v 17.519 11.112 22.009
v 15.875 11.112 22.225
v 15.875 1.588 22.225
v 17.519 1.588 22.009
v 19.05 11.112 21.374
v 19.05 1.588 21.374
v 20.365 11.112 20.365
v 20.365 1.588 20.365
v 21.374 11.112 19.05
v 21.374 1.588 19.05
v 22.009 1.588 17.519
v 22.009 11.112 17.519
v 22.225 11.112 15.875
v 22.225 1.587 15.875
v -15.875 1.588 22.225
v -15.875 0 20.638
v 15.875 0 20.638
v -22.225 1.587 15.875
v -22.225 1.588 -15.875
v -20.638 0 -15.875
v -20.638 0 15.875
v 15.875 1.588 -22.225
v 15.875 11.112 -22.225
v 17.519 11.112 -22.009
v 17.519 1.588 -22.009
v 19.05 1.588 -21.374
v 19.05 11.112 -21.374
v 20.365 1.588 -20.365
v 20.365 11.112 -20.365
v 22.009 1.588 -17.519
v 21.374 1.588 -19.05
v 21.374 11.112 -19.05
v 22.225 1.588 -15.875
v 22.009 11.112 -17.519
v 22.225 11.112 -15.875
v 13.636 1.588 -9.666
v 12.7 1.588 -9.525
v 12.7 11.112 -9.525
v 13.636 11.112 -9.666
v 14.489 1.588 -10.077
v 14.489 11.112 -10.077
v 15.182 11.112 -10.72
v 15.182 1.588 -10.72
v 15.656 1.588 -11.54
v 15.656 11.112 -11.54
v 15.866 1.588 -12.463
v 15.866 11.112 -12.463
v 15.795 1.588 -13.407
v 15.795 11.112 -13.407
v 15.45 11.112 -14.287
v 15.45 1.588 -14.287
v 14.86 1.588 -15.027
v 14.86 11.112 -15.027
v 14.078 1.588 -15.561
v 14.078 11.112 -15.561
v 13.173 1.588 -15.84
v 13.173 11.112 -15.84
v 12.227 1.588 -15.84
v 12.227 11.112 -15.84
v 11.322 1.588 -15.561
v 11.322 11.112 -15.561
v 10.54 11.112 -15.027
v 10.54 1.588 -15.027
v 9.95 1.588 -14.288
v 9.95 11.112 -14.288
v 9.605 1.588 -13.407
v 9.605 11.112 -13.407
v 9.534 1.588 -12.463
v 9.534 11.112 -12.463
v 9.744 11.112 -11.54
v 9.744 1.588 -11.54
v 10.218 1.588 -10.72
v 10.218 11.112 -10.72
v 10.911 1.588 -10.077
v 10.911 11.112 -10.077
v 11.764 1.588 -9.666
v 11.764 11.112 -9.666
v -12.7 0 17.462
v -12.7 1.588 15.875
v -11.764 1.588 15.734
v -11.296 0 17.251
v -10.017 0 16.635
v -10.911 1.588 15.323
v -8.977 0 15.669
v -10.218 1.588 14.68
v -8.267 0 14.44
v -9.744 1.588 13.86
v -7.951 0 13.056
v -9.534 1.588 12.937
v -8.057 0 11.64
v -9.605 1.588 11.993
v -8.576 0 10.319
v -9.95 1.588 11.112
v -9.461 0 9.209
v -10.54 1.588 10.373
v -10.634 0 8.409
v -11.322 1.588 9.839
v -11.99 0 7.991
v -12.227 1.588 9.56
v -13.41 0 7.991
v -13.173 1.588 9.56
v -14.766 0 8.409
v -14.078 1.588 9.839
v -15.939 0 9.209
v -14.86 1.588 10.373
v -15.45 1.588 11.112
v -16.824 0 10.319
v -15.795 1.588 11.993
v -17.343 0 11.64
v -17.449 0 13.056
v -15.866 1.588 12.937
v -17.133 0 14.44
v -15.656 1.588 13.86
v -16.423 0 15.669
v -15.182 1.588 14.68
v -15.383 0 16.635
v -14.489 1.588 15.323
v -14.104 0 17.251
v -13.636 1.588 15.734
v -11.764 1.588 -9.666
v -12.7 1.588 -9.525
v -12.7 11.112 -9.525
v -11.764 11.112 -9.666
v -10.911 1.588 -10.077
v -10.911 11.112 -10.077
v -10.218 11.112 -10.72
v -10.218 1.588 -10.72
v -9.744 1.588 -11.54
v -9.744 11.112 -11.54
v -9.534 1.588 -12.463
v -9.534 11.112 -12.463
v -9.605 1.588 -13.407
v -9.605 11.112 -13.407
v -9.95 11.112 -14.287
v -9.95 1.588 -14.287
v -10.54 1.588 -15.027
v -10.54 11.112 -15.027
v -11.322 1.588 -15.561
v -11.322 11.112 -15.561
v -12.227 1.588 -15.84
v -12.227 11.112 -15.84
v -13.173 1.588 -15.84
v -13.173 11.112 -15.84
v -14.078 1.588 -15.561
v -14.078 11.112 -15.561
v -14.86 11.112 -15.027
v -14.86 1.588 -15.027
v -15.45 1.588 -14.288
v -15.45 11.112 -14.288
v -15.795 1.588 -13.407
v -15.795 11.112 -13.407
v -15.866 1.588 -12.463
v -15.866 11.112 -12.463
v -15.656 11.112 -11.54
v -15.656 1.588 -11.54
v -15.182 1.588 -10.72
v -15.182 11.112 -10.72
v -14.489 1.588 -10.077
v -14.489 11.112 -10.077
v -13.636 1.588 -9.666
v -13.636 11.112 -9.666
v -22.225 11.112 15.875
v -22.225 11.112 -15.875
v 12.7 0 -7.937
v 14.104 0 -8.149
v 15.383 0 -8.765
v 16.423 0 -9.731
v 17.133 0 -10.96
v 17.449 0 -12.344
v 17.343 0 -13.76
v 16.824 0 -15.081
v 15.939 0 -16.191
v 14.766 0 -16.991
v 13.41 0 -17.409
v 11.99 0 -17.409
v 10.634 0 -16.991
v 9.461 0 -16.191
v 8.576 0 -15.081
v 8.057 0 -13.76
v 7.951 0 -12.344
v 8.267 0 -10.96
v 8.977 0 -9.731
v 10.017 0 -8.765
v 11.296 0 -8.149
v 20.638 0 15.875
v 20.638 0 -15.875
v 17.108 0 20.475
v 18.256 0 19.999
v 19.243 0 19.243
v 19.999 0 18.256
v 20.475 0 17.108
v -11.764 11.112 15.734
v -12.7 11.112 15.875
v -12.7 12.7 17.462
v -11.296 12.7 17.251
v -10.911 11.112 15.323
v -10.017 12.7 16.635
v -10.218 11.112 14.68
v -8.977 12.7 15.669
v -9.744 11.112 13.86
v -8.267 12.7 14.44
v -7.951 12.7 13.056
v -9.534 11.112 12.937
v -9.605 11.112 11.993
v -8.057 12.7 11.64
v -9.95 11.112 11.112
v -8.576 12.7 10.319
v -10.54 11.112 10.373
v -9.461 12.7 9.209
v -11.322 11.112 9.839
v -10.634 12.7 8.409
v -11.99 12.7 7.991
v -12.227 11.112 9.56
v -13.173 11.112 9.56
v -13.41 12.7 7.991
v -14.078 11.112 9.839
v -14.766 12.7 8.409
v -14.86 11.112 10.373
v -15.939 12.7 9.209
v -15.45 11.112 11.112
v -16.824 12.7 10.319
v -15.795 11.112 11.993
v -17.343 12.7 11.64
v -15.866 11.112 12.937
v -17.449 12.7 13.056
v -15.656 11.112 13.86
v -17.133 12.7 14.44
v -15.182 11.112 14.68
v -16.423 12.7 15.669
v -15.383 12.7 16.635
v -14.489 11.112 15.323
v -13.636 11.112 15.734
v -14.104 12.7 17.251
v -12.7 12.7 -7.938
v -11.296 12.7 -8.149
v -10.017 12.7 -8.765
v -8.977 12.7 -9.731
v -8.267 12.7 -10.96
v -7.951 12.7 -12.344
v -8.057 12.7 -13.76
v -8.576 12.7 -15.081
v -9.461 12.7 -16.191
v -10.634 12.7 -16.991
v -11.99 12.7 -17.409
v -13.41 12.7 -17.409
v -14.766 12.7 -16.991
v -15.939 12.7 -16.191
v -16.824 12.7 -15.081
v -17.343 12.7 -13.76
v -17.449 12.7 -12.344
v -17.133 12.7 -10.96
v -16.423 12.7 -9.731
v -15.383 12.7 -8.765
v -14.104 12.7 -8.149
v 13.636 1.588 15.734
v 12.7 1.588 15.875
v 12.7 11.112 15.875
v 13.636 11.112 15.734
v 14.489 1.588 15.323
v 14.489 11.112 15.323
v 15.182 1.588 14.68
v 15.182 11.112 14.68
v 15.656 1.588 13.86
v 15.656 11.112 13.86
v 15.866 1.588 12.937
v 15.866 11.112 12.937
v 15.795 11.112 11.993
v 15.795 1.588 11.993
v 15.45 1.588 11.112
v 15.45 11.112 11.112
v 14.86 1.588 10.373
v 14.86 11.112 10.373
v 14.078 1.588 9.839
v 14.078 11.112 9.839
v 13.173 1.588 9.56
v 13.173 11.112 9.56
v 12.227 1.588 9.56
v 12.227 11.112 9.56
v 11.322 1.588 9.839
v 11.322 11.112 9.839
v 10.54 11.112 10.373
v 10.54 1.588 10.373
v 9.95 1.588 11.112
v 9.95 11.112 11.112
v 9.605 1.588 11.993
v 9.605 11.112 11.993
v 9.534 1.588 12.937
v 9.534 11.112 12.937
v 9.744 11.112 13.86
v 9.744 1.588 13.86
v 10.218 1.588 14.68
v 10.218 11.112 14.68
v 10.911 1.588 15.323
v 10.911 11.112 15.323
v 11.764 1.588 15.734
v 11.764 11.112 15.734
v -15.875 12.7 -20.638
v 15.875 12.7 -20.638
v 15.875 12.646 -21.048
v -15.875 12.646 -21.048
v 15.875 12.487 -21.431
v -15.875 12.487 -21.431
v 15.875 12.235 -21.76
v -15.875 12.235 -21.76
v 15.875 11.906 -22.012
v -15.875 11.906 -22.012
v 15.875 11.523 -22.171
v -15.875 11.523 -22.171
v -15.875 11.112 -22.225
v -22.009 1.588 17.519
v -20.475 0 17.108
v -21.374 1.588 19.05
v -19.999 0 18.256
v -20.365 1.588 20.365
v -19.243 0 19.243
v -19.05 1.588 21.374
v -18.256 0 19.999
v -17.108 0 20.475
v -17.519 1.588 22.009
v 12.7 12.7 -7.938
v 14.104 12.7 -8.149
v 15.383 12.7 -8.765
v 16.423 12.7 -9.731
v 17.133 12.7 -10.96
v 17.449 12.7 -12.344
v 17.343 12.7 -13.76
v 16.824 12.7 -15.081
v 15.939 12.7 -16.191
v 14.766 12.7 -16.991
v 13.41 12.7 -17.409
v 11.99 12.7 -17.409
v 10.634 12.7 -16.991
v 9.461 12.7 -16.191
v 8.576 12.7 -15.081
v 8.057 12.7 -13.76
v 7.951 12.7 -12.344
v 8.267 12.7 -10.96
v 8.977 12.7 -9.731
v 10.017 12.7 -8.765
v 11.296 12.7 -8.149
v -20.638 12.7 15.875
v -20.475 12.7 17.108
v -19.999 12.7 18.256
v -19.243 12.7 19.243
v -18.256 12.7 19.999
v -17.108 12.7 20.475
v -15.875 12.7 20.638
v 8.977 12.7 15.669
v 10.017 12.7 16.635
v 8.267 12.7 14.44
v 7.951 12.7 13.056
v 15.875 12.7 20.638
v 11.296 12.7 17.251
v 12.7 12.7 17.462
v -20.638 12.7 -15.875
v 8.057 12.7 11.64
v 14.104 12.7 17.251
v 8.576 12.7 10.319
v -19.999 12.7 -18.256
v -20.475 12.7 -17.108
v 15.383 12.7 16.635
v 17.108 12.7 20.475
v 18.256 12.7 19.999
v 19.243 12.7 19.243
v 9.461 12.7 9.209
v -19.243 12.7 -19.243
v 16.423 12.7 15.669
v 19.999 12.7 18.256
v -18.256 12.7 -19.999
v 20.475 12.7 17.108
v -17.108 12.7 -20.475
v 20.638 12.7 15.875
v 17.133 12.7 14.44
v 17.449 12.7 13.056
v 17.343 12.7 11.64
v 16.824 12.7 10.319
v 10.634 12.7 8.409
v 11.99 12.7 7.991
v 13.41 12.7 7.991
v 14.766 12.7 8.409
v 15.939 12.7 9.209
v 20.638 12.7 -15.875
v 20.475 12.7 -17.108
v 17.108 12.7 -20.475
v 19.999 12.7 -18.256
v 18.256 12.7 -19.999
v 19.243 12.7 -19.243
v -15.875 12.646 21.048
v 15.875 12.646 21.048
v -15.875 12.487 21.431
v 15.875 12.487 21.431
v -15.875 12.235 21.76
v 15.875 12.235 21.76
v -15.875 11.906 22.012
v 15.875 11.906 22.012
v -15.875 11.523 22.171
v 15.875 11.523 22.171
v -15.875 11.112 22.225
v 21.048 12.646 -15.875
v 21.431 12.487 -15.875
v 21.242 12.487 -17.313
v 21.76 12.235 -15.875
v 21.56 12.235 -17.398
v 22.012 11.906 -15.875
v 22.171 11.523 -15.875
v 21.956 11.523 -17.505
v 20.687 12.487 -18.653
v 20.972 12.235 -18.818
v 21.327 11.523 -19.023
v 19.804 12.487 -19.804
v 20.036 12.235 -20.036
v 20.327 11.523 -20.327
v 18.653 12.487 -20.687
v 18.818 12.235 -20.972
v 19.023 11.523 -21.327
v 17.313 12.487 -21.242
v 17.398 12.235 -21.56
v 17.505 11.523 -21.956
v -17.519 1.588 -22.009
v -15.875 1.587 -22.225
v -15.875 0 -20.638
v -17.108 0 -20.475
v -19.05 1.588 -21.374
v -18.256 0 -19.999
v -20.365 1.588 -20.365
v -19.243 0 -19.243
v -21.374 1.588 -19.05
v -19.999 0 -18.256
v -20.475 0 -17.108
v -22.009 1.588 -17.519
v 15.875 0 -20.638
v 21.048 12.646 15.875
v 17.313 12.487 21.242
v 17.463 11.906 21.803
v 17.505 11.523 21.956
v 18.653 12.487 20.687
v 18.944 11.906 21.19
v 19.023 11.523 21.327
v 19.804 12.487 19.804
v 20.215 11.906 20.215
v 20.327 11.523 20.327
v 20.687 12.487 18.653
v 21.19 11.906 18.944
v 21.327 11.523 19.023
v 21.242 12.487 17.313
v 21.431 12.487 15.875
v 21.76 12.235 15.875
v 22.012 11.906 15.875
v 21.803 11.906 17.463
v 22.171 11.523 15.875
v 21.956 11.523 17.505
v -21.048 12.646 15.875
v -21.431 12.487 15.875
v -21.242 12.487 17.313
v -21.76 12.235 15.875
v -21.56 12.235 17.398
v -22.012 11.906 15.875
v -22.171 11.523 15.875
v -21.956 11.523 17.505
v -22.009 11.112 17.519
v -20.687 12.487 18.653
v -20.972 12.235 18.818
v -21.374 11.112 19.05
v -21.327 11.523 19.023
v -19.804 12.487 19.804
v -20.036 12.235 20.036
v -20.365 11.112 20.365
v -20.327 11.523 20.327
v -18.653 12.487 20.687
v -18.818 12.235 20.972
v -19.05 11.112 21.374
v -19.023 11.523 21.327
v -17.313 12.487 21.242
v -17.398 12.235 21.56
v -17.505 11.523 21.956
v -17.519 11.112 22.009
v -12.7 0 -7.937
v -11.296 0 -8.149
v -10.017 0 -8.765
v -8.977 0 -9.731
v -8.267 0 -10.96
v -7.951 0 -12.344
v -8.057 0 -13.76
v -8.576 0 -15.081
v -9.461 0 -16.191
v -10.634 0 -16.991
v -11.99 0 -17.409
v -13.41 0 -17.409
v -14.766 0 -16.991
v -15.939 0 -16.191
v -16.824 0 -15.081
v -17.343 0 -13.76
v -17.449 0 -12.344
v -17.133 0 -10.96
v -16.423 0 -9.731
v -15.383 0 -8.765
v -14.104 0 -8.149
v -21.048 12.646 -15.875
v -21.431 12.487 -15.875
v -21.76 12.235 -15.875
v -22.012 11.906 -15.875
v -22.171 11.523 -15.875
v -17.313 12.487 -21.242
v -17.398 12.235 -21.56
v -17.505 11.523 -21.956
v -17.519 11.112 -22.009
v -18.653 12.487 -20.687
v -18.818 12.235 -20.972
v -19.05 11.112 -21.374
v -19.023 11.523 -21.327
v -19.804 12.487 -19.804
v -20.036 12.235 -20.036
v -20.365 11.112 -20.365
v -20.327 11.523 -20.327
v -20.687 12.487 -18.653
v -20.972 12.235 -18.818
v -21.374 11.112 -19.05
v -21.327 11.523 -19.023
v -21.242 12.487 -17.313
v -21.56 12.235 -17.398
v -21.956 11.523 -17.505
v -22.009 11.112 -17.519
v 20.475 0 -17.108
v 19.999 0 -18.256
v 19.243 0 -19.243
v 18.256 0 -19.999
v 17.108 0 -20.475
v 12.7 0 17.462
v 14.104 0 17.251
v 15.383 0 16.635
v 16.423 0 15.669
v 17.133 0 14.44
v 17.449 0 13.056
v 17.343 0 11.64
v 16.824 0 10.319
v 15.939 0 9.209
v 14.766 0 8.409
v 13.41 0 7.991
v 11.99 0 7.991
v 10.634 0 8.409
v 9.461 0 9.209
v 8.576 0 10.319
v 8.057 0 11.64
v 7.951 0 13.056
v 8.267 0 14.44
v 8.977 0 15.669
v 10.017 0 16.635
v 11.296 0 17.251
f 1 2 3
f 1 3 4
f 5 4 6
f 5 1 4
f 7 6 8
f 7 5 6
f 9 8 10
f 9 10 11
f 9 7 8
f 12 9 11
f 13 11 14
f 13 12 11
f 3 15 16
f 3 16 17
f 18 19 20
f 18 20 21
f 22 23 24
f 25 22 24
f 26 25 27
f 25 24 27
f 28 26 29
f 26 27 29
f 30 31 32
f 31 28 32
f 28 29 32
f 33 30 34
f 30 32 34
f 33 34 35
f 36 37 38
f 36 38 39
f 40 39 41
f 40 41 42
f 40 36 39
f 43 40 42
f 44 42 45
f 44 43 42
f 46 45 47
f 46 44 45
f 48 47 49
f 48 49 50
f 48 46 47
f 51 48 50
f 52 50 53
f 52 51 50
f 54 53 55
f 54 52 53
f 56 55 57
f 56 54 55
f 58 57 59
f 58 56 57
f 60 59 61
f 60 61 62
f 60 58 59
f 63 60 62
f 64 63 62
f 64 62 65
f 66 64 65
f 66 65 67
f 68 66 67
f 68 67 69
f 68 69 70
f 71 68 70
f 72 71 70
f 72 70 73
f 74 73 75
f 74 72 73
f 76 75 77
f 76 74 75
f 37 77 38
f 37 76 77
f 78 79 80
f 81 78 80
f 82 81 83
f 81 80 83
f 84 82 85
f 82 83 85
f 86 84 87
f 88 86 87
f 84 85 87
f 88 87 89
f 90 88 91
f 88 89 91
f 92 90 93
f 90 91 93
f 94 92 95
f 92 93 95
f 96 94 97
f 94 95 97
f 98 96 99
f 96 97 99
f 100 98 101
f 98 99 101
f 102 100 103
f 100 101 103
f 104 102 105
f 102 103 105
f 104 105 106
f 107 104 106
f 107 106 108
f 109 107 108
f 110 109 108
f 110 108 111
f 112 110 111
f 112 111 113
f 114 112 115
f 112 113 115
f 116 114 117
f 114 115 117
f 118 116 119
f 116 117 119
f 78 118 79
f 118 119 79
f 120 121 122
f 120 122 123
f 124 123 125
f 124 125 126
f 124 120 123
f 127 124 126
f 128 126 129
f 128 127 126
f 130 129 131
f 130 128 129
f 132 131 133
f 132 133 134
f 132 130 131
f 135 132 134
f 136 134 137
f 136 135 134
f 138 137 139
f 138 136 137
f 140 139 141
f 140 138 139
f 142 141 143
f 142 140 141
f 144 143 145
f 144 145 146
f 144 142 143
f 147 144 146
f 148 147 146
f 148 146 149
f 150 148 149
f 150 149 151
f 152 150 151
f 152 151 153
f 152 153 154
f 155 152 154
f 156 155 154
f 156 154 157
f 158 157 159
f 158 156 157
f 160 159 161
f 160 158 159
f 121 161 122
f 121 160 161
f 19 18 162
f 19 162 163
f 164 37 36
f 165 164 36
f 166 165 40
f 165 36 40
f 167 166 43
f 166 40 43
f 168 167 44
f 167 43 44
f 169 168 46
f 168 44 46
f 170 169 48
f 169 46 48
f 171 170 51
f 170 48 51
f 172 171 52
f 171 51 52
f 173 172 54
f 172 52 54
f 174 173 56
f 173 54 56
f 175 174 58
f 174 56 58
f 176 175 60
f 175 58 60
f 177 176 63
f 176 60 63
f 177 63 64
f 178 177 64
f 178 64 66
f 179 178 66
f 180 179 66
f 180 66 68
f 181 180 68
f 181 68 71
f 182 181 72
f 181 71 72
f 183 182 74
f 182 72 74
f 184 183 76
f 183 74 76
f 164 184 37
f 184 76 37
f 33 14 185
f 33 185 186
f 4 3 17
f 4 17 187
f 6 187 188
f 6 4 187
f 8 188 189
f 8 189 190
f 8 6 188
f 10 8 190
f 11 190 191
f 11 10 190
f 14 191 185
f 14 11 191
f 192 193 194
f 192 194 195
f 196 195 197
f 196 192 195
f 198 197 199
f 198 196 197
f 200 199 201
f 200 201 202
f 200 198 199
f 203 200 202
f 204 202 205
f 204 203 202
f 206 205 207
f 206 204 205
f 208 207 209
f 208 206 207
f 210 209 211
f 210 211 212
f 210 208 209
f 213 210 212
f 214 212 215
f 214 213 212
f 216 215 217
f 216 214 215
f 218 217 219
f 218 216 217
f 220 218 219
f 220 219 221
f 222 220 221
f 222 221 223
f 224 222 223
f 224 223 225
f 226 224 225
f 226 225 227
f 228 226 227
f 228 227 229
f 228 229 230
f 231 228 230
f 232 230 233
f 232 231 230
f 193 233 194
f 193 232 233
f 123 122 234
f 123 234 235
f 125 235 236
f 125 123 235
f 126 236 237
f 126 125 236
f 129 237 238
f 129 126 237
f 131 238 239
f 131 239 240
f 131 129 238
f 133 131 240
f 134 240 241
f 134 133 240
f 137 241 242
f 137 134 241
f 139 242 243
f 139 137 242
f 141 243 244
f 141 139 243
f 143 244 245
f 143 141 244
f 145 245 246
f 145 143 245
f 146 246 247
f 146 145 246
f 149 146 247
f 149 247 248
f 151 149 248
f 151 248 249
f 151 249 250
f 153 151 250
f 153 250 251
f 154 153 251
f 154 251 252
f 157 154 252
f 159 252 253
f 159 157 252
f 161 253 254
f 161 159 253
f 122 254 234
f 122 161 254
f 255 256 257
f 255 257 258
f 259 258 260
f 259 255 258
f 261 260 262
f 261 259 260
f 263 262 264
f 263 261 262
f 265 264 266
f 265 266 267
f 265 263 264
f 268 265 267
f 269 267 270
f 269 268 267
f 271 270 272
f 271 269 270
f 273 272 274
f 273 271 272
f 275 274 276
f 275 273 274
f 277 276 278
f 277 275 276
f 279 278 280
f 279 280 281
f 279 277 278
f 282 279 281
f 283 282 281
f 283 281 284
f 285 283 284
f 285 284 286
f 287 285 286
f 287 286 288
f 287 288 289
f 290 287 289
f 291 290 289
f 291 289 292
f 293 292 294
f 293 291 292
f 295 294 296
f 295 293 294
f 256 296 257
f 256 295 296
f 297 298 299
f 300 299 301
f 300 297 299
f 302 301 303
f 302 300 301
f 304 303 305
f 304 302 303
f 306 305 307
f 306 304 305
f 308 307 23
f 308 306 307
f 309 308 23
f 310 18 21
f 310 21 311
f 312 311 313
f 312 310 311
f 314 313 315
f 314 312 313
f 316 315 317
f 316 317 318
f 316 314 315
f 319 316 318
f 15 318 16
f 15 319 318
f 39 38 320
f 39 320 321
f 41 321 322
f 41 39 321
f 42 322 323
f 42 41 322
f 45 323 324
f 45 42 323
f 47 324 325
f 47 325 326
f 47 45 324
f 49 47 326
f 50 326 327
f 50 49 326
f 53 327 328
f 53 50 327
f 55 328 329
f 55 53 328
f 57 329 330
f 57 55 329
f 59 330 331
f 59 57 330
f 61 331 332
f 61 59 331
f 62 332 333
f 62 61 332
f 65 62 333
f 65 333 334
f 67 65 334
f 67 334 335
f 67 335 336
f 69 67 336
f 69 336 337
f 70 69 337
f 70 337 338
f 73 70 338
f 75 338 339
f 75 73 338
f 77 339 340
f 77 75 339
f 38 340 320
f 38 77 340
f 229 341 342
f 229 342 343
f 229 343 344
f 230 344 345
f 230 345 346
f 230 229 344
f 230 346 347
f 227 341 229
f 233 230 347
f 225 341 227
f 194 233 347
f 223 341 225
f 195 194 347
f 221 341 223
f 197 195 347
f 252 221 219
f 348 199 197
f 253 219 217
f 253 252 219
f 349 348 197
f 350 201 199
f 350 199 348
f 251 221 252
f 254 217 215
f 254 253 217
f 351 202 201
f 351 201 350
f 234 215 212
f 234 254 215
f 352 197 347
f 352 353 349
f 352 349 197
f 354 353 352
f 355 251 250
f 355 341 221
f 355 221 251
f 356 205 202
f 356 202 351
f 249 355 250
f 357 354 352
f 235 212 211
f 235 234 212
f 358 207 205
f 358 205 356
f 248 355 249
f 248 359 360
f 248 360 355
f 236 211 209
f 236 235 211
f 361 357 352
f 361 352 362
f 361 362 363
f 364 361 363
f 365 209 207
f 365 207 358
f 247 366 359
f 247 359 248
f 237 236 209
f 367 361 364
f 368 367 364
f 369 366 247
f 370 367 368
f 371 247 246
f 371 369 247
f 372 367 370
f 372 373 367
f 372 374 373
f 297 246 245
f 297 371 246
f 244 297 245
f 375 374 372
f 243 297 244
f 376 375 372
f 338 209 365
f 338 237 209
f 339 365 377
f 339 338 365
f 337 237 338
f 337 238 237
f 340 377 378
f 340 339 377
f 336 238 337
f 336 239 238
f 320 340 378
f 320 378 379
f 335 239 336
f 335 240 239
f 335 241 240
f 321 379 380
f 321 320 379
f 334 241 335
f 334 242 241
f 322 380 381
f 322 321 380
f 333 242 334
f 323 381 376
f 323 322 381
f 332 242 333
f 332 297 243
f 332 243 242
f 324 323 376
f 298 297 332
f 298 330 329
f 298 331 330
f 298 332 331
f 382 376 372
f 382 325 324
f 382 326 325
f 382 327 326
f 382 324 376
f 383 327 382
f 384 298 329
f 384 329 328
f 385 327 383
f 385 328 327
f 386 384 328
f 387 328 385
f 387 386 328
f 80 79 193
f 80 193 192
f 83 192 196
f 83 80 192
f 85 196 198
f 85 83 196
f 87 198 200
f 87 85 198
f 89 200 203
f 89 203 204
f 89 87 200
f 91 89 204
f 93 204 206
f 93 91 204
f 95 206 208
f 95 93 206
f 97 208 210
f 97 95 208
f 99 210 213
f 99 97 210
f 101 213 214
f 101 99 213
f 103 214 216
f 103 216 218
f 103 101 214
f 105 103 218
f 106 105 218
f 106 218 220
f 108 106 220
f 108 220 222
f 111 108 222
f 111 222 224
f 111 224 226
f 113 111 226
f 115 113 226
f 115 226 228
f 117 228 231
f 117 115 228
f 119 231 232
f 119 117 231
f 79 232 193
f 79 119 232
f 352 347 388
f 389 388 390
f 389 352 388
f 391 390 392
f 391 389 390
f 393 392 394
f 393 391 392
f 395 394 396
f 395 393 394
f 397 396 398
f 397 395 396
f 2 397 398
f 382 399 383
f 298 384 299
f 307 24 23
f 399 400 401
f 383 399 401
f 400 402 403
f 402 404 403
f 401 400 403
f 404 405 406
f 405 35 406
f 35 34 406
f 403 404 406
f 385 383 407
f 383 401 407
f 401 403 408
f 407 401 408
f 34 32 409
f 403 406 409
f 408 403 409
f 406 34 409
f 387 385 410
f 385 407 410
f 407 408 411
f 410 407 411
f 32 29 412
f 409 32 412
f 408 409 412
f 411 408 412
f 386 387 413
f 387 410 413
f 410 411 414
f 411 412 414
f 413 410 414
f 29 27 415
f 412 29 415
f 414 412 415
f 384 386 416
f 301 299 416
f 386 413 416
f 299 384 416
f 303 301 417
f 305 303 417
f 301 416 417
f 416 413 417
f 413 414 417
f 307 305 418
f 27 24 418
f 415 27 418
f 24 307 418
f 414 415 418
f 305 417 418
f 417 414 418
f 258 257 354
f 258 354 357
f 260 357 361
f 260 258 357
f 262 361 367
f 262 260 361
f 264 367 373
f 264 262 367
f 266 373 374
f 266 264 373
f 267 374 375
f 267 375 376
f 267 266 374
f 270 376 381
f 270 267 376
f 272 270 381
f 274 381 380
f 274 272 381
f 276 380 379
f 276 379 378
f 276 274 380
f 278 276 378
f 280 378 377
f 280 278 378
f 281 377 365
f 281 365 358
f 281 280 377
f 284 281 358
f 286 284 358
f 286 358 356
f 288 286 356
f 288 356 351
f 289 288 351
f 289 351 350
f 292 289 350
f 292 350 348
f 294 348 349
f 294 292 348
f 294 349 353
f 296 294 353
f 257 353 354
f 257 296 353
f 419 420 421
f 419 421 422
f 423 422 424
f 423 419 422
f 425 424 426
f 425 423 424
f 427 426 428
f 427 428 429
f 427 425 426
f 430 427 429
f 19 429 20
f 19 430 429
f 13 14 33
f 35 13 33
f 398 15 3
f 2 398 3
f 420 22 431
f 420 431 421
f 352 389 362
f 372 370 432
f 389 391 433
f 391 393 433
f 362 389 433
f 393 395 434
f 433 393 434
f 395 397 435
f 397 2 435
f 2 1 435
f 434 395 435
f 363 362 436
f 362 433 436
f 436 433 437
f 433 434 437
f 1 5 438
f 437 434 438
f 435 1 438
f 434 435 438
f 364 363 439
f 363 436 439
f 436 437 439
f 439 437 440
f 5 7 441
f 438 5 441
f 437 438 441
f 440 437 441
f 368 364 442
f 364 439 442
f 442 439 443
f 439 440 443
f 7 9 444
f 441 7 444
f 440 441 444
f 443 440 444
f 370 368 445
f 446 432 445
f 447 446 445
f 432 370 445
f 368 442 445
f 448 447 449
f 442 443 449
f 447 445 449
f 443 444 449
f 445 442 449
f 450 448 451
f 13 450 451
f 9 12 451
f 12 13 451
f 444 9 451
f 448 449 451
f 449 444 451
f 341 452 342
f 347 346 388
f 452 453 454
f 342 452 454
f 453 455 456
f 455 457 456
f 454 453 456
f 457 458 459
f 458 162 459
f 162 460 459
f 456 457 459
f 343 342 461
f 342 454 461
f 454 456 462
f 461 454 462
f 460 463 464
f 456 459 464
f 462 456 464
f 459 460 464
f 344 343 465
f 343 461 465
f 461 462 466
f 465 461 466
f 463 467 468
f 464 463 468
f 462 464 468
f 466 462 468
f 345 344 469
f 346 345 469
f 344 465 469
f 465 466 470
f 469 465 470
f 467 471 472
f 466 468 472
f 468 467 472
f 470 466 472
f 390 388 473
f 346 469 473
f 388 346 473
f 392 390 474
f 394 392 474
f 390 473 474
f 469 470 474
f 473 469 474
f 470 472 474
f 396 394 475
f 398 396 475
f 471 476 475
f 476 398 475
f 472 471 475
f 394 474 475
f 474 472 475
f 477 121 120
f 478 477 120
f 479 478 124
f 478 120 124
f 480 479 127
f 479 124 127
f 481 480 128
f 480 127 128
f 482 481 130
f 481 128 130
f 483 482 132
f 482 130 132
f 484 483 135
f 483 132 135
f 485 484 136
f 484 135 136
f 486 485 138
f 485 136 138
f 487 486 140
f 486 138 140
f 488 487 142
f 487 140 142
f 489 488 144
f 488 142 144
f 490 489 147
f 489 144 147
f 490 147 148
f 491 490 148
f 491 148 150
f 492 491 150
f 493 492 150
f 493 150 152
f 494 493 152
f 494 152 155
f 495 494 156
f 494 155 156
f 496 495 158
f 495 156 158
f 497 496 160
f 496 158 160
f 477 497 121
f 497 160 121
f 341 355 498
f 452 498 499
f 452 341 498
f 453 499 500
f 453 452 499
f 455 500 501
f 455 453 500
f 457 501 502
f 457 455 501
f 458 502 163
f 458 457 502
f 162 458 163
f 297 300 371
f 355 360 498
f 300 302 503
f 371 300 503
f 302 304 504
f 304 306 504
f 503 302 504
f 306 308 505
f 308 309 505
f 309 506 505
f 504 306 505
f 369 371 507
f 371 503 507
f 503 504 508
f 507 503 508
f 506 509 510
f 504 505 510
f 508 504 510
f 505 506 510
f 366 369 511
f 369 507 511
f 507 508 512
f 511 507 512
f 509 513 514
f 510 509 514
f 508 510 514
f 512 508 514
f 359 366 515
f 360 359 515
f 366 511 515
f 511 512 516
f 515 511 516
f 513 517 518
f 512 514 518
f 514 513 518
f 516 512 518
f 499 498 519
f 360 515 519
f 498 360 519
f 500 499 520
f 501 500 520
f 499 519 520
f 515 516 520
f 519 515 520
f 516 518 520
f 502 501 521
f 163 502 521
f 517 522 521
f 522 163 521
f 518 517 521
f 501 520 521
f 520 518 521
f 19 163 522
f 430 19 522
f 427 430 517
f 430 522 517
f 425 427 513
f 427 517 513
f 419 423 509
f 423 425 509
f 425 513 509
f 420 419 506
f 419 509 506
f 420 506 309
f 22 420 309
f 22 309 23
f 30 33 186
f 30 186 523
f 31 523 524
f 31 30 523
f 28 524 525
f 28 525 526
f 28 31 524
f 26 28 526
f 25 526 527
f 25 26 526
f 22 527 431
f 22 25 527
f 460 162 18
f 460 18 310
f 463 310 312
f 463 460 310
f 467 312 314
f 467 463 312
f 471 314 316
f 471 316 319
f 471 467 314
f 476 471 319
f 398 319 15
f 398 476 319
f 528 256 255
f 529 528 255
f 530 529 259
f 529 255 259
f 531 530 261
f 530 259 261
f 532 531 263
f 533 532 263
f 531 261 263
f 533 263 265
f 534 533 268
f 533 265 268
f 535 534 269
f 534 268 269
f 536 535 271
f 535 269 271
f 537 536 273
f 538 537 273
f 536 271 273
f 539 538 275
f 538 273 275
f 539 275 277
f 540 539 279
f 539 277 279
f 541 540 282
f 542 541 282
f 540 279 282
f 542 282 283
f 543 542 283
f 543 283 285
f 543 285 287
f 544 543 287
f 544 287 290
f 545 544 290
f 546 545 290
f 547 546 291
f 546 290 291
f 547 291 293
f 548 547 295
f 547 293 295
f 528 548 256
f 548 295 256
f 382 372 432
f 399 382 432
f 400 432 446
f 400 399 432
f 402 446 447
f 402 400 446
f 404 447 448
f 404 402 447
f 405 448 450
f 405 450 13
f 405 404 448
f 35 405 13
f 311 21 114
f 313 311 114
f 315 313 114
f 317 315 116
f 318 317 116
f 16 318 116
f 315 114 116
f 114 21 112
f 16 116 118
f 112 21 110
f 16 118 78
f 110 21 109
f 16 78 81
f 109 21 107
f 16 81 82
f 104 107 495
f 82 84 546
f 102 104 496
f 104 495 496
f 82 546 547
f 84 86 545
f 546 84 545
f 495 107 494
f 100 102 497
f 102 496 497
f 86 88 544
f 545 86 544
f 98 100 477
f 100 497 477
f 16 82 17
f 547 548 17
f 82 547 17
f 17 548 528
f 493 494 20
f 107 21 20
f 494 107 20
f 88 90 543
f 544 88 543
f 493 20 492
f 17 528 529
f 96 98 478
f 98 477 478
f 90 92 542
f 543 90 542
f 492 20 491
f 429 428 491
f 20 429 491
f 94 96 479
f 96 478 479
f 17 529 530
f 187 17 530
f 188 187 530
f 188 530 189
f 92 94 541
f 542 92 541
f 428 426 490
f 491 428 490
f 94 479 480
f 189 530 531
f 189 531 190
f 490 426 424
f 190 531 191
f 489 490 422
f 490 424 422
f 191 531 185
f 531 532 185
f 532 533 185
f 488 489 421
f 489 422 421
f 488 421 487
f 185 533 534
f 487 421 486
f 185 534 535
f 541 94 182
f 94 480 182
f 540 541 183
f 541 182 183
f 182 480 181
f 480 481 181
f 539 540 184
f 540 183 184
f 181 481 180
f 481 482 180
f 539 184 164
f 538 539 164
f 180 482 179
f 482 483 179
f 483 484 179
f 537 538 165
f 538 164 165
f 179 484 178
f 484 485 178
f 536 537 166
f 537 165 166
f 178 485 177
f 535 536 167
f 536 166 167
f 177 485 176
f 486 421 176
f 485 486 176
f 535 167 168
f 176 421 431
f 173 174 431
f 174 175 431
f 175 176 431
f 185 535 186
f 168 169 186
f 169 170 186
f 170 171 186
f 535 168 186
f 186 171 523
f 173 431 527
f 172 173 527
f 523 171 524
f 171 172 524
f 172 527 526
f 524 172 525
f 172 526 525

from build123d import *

# Parameters (mm, degrees)
SKETCH2_W           = 44.45
SKETCH2_H           = 44.45
SKETCH2_R           = 3.175
BOSS_EXTRUDE1_DEPTH = 12.7
FILLET1_R           = 6.35
FILLET2_R           = 1.5875
CHAMFER1_SIZE       = 1.5875


with BuildPart() as part:
    # Sketch2 → Boss-Extrude1 (new body)
    with BuildSketch(Plane(origin=(0, 0, 0), x_dir=(1, 0, 0), z_dir=(0, 1, 0))):
        Rectangle(SKETCH2_W, SKETCH2_H)
        with Locations(Location((-12.7, -12.7, 0), (0, 0, 270))):
            Circle(SKETCH2_R, mode=Mode.SUBTRACT)
        with Locations(Location((12.7, -12.7, 0), (0, 0, 270))):
            Circle(SKETCH2_R, mode=Mode.SUBTRACT)
        with Locations(Location((12.7, 12.7, 0), (0, 0, 270))):
            Circle(SKETCH2_R, mode=Mode.SUBTRACT)
        with Locations(Location((-12.7, 12.7, 0), (0, 0, 270))):
            Circle(SKETCH2_R, mode=Mode.SUBTRACT)
    extrude(amount=BOSS_EXTRUDE1_DEPTH)

    # Fillet1
    fillet1_edges = [part.edges().sort_by_distance(p)[0] for p in [
        (22.225, 6.35, 22.225),
        (-22.225, 6.35, 22.225),
        (-22.225, 6.35, -22.225),
        (22.225, 6.35, -22.225),
    ]]
    fillet(fillet1_edges, radius=FILLET1_R)

    # Fillet2
    fillet2_edges = [part.edges().sort_by_distance(p)[0] for p in [
        (22.225, 12.7, 0),
        (0, 12.7, 22.225),
        (0, 12.7, -22.225),
        (-22.225, 12.7, 0),
        (-20.365128061, 12.7, 20.365128061),
        (20.365128061, 12.7, -20.365128061),
        (-20.365128061, 12.7, -20.365128061),
        (20.365128061, 12.7, 20.365128061),
    ]]
    fillet(fillet2_edges, radius=FILLET2_R)

    # Chamfer1
    chamfer1_edges = [part.edges().sort_by_distance(p)[0] for p in [
        (-12.7, 0, 9.525),
        (-12.7, 12.7, 9.525),
        (12.7, 0, 9.525),
        (12.7, 12.7, 9.525),
        (12.7, 0, -15.875),
        (12.7, 12.7, -15.875),
        (-12.7, 0, -15.875),
        (-12.7, 12.7, -15.875),
        (22.225, 0, 0),
        (0, 0, 22.225),
        (-22.225, 0, 0),
        (0, 0, -22.225),
        (-20.365128061, 0, 20.365128061),
        (20.365128061, 0, -20.365128061),
        (-20.365128061, 0, -20.365128061),
        (20.365128061, 0, 20.365128061),
    ]]
    chamfer(chamfer1_edges, length=CHAMFER1_SIZE)


solid = part.part
